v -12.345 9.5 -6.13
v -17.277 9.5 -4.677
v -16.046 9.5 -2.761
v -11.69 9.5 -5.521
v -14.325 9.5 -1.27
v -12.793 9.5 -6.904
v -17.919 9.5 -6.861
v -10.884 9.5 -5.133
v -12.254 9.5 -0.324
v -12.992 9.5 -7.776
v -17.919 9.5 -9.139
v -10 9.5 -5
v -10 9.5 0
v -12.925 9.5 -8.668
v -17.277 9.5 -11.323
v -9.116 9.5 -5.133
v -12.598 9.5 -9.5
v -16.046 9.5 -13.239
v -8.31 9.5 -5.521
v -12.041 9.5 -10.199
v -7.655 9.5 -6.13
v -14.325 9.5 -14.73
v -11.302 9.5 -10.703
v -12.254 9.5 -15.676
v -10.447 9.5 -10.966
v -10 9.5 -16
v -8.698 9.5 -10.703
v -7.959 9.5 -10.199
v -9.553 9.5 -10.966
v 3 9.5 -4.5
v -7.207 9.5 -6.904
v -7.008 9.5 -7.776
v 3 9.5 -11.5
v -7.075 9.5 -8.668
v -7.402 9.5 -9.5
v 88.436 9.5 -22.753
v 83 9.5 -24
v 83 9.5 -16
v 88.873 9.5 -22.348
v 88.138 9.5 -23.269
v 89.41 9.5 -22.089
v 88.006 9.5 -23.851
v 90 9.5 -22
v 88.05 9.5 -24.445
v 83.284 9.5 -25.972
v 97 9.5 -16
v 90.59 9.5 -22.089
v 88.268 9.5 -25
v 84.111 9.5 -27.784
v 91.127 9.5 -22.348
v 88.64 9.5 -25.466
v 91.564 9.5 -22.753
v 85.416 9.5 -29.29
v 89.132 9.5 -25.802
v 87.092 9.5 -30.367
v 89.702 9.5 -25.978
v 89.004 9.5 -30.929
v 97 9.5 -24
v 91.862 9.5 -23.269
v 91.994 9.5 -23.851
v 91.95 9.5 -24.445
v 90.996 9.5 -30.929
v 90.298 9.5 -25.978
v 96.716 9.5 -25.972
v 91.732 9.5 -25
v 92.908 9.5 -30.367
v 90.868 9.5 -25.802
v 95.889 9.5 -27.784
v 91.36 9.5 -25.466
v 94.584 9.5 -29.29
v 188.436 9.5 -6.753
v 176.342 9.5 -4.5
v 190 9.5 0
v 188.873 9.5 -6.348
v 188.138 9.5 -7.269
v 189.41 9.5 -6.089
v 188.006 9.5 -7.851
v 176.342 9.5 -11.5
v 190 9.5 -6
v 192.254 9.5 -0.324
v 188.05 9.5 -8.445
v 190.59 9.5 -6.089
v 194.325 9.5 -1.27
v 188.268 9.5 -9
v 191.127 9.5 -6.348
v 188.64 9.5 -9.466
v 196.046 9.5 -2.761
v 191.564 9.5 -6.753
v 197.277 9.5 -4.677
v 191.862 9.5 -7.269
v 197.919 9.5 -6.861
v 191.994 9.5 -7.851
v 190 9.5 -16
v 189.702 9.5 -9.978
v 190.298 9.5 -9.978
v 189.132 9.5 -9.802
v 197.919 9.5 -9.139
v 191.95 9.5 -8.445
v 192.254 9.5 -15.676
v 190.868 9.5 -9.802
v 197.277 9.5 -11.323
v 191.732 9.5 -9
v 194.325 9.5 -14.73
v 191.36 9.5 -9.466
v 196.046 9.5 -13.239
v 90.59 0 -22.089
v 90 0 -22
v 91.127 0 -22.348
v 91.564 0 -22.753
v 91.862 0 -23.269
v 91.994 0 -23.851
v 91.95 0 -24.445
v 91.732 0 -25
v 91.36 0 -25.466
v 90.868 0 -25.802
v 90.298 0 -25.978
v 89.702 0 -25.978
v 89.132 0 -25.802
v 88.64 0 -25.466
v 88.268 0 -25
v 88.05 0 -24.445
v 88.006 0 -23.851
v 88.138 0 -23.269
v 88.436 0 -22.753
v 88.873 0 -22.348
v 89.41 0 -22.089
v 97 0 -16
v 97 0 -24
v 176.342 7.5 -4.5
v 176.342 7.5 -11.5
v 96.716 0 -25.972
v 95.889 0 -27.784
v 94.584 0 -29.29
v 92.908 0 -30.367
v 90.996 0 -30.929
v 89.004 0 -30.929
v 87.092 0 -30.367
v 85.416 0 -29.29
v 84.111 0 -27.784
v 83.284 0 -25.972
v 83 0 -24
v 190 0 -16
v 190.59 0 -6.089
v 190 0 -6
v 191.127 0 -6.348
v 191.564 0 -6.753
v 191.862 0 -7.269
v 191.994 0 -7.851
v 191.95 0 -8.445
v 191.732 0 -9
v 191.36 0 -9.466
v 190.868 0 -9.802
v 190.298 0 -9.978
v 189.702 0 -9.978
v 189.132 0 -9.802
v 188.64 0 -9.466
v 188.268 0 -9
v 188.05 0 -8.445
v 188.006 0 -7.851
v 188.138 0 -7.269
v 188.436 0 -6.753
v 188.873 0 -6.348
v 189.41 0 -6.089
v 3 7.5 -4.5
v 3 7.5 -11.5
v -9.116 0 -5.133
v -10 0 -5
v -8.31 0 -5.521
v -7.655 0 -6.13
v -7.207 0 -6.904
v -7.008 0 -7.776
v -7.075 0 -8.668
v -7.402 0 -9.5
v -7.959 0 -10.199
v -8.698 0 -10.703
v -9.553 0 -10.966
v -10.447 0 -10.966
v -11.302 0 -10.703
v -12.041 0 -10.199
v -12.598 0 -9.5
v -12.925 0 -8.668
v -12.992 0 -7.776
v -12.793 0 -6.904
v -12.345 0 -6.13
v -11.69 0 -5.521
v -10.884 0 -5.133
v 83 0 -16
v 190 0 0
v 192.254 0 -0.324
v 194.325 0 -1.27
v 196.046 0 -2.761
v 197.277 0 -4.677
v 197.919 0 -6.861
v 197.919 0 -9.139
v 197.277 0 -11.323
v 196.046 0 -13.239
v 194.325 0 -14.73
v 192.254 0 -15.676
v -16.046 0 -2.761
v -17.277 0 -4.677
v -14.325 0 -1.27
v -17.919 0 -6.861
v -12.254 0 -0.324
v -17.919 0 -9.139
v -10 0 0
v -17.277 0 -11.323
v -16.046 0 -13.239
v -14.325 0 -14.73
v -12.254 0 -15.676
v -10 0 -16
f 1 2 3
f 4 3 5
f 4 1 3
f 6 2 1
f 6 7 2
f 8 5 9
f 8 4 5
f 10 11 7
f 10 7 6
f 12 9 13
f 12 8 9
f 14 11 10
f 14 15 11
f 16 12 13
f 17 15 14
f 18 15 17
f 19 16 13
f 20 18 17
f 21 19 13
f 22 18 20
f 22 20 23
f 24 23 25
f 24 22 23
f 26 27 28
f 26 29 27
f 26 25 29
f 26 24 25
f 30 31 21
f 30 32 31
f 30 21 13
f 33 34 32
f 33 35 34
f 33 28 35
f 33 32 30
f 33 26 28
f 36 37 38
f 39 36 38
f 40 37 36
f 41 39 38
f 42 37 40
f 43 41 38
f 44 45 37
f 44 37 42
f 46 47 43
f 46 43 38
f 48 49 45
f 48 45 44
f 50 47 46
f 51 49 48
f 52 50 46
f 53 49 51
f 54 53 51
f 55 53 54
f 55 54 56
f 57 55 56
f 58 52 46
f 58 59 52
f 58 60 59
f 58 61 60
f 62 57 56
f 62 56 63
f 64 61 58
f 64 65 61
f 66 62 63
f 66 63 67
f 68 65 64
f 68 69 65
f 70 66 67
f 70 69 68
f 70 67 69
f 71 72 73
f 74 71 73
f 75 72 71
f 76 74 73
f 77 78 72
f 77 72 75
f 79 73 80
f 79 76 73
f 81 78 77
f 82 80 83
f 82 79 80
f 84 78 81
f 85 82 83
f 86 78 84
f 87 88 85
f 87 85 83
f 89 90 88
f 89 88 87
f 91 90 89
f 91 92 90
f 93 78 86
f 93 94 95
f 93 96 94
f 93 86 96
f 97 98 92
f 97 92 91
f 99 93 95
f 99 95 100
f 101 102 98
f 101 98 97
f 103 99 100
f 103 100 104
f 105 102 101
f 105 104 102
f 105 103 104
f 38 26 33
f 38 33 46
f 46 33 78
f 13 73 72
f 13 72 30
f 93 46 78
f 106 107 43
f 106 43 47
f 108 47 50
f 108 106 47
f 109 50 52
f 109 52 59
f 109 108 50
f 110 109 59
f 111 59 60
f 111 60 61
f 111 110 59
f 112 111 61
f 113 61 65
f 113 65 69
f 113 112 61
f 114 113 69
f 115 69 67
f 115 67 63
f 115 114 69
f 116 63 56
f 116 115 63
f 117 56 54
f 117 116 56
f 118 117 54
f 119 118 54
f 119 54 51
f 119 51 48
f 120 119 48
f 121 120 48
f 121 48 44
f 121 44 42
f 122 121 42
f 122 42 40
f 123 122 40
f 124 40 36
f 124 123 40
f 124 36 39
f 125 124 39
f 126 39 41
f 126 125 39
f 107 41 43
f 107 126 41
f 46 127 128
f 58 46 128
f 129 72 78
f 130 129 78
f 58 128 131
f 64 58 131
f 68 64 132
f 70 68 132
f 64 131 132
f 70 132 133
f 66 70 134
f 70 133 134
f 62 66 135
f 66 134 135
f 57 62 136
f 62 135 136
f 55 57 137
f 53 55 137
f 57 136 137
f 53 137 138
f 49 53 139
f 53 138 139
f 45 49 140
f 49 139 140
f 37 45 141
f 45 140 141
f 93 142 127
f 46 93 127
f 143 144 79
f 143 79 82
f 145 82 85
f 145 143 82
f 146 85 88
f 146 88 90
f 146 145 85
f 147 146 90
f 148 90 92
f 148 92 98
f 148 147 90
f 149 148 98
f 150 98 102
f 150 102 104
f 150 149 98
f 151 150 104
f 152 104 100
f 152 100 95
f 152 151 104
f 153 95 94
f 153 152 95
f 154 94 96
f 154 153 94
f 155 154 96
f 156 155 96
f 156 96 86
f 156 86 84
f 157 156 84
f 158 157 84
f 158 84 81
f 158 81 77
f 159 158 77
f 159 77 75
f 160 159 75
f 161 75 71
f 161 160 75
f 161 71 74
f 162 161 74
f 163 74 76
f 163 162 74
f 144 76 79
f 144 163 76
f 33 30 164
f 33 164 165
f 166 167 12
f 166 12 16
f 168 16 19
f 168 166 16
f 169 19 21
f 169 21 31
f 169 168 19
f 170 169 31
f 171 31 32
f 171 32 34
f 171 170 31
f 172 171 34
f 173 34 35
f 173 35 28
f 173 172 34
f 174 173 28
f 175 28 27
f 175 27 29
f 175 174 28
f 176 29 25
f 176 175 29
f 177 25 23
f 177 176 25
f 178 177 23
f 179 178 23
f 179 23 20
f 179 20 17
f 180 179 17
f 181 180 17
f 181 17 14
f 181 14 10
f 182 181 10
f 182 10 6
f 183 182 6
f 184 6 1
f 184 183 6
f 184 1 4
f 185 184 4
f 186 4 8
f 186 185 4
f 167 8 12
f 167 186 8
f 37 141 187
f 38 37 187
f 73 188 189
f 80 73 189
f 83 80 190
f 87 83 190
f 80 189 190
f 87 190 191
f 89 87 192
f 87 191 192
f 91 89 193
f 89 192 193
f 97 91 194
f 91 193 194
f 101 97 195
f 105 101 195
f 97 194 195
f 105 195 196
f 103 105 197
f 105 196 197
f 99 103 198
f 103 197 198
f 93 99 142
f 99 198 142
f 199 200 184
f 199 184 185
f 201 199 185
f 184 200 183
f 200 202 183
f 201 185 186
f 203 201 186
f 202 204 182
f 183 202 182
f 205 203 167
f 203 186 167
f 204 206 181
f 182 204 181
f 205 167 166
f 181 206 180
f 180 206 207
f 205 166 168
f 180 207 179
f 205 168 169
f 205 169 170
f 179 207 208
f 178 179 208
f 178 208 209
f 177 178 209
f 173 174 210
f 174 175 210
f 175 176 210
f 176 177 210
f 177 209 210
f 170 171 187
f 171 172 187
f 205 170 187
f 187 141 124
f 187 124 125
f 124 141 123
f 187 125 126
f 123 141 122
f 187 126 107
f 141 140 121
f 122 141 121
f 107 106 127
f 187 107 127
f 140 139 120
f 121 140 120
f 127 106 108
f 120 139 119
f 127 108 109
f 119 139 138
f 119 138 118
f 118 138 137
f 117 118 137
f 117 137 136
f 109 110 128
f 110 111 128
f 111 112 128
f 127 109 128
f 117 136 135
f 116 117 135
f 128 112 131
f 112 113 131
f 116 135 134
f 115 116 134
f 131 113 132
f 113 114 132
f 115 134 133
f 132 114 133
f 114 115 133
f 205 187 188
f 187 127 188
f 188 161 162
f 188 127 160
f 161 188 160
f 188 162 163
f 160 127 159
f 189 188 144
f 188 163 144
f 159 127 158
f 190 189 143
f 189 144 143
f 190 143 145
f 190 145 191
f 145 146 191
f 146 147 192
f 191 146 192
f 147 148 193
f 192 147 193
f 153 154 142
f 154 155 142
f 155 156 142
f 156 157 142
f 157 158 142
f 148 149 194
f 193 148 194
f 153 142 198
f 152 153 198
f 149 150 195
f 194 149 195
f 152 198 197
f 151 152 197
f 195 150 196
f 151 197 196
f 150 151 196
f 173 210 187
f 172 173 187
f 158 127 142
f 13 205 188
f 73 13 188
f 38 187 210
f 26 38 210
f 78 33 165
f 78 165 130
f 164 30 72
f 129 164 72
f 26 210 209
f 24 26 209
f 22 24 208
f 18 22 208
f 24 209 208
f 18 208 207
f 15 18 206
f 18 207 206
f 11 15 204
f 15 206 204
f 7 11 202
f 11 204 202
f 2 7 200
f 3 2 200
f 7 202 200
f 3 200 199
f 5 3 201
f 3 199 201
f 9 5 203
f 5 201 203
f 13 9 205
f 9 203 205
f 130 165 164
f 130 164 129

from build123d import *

# Parameters (mm, degrees)
SKETCH1_R           = 2
SKETCH1_R_2         = 3
BOSS_EXTRUDE1_DEPTH = 9.5
SKETCH2_W           = 173.341634435
SKETCH2_H           = 7
CUT_EXTRUDE1_DEPTH  = 2


with BuildPart() as part:
    # Sketch1 → Boss-Extrude1 (new body)
    with BuildSketch(Plane(origin=(0, 0, 0), x_dir=(1, 0, 0), z_dir=(0, 1, 0))):
        with BuildLine():
            Line((97, 16), (97, 24))
            ThreePointArc((97, 24), (90, 31), (83, 24))
            Line((83, 24), (83, 16))
            Line((83, 16), (-10, 16))
            ThreePointArc((-10, 16), (-18, 8), (-10, 0))
            Line((-10, 0), (190, 0))
            ThreePointArc((190, 0), (198, 8), (190, 16))
            Line((190, 16), (97, 16))
        make_face()
        with Locations(Location((90, 24, 0), (0, 0, 270))):
            Circle(SKETCH1_R, mode=Mode.SUBTRACT)
        with Locations(Location((-10, 8, 0), (0, 0, 270))):
            Circle(SKETCH1_R_2, mode=Mode.SUBTRACT)
        with Locations(Location((190, 8, 0), (0, 0, 270))):
            Circle(SKETCH1_R, mode=Mode.SUBTRACT)
    extrude(amount=BOSS_EXTRUDE1_DEPTH)

    # Sketch2 → Cut-Extrude1 (cut)
    with BuildSketch(Plane(origin=(0, 9.5, 0), x_dir=(1, 0, 0), z_dir=(0, 1, 0))):
        with Locations((89.670817218, 8)):
            Rectangle(SKETCH2_W, SKETCH2_H)
    extrude(amount=-CUT_EXTRUDE1_DEPTH, mode=Mode.SUBTRACT)


solid = part.part
